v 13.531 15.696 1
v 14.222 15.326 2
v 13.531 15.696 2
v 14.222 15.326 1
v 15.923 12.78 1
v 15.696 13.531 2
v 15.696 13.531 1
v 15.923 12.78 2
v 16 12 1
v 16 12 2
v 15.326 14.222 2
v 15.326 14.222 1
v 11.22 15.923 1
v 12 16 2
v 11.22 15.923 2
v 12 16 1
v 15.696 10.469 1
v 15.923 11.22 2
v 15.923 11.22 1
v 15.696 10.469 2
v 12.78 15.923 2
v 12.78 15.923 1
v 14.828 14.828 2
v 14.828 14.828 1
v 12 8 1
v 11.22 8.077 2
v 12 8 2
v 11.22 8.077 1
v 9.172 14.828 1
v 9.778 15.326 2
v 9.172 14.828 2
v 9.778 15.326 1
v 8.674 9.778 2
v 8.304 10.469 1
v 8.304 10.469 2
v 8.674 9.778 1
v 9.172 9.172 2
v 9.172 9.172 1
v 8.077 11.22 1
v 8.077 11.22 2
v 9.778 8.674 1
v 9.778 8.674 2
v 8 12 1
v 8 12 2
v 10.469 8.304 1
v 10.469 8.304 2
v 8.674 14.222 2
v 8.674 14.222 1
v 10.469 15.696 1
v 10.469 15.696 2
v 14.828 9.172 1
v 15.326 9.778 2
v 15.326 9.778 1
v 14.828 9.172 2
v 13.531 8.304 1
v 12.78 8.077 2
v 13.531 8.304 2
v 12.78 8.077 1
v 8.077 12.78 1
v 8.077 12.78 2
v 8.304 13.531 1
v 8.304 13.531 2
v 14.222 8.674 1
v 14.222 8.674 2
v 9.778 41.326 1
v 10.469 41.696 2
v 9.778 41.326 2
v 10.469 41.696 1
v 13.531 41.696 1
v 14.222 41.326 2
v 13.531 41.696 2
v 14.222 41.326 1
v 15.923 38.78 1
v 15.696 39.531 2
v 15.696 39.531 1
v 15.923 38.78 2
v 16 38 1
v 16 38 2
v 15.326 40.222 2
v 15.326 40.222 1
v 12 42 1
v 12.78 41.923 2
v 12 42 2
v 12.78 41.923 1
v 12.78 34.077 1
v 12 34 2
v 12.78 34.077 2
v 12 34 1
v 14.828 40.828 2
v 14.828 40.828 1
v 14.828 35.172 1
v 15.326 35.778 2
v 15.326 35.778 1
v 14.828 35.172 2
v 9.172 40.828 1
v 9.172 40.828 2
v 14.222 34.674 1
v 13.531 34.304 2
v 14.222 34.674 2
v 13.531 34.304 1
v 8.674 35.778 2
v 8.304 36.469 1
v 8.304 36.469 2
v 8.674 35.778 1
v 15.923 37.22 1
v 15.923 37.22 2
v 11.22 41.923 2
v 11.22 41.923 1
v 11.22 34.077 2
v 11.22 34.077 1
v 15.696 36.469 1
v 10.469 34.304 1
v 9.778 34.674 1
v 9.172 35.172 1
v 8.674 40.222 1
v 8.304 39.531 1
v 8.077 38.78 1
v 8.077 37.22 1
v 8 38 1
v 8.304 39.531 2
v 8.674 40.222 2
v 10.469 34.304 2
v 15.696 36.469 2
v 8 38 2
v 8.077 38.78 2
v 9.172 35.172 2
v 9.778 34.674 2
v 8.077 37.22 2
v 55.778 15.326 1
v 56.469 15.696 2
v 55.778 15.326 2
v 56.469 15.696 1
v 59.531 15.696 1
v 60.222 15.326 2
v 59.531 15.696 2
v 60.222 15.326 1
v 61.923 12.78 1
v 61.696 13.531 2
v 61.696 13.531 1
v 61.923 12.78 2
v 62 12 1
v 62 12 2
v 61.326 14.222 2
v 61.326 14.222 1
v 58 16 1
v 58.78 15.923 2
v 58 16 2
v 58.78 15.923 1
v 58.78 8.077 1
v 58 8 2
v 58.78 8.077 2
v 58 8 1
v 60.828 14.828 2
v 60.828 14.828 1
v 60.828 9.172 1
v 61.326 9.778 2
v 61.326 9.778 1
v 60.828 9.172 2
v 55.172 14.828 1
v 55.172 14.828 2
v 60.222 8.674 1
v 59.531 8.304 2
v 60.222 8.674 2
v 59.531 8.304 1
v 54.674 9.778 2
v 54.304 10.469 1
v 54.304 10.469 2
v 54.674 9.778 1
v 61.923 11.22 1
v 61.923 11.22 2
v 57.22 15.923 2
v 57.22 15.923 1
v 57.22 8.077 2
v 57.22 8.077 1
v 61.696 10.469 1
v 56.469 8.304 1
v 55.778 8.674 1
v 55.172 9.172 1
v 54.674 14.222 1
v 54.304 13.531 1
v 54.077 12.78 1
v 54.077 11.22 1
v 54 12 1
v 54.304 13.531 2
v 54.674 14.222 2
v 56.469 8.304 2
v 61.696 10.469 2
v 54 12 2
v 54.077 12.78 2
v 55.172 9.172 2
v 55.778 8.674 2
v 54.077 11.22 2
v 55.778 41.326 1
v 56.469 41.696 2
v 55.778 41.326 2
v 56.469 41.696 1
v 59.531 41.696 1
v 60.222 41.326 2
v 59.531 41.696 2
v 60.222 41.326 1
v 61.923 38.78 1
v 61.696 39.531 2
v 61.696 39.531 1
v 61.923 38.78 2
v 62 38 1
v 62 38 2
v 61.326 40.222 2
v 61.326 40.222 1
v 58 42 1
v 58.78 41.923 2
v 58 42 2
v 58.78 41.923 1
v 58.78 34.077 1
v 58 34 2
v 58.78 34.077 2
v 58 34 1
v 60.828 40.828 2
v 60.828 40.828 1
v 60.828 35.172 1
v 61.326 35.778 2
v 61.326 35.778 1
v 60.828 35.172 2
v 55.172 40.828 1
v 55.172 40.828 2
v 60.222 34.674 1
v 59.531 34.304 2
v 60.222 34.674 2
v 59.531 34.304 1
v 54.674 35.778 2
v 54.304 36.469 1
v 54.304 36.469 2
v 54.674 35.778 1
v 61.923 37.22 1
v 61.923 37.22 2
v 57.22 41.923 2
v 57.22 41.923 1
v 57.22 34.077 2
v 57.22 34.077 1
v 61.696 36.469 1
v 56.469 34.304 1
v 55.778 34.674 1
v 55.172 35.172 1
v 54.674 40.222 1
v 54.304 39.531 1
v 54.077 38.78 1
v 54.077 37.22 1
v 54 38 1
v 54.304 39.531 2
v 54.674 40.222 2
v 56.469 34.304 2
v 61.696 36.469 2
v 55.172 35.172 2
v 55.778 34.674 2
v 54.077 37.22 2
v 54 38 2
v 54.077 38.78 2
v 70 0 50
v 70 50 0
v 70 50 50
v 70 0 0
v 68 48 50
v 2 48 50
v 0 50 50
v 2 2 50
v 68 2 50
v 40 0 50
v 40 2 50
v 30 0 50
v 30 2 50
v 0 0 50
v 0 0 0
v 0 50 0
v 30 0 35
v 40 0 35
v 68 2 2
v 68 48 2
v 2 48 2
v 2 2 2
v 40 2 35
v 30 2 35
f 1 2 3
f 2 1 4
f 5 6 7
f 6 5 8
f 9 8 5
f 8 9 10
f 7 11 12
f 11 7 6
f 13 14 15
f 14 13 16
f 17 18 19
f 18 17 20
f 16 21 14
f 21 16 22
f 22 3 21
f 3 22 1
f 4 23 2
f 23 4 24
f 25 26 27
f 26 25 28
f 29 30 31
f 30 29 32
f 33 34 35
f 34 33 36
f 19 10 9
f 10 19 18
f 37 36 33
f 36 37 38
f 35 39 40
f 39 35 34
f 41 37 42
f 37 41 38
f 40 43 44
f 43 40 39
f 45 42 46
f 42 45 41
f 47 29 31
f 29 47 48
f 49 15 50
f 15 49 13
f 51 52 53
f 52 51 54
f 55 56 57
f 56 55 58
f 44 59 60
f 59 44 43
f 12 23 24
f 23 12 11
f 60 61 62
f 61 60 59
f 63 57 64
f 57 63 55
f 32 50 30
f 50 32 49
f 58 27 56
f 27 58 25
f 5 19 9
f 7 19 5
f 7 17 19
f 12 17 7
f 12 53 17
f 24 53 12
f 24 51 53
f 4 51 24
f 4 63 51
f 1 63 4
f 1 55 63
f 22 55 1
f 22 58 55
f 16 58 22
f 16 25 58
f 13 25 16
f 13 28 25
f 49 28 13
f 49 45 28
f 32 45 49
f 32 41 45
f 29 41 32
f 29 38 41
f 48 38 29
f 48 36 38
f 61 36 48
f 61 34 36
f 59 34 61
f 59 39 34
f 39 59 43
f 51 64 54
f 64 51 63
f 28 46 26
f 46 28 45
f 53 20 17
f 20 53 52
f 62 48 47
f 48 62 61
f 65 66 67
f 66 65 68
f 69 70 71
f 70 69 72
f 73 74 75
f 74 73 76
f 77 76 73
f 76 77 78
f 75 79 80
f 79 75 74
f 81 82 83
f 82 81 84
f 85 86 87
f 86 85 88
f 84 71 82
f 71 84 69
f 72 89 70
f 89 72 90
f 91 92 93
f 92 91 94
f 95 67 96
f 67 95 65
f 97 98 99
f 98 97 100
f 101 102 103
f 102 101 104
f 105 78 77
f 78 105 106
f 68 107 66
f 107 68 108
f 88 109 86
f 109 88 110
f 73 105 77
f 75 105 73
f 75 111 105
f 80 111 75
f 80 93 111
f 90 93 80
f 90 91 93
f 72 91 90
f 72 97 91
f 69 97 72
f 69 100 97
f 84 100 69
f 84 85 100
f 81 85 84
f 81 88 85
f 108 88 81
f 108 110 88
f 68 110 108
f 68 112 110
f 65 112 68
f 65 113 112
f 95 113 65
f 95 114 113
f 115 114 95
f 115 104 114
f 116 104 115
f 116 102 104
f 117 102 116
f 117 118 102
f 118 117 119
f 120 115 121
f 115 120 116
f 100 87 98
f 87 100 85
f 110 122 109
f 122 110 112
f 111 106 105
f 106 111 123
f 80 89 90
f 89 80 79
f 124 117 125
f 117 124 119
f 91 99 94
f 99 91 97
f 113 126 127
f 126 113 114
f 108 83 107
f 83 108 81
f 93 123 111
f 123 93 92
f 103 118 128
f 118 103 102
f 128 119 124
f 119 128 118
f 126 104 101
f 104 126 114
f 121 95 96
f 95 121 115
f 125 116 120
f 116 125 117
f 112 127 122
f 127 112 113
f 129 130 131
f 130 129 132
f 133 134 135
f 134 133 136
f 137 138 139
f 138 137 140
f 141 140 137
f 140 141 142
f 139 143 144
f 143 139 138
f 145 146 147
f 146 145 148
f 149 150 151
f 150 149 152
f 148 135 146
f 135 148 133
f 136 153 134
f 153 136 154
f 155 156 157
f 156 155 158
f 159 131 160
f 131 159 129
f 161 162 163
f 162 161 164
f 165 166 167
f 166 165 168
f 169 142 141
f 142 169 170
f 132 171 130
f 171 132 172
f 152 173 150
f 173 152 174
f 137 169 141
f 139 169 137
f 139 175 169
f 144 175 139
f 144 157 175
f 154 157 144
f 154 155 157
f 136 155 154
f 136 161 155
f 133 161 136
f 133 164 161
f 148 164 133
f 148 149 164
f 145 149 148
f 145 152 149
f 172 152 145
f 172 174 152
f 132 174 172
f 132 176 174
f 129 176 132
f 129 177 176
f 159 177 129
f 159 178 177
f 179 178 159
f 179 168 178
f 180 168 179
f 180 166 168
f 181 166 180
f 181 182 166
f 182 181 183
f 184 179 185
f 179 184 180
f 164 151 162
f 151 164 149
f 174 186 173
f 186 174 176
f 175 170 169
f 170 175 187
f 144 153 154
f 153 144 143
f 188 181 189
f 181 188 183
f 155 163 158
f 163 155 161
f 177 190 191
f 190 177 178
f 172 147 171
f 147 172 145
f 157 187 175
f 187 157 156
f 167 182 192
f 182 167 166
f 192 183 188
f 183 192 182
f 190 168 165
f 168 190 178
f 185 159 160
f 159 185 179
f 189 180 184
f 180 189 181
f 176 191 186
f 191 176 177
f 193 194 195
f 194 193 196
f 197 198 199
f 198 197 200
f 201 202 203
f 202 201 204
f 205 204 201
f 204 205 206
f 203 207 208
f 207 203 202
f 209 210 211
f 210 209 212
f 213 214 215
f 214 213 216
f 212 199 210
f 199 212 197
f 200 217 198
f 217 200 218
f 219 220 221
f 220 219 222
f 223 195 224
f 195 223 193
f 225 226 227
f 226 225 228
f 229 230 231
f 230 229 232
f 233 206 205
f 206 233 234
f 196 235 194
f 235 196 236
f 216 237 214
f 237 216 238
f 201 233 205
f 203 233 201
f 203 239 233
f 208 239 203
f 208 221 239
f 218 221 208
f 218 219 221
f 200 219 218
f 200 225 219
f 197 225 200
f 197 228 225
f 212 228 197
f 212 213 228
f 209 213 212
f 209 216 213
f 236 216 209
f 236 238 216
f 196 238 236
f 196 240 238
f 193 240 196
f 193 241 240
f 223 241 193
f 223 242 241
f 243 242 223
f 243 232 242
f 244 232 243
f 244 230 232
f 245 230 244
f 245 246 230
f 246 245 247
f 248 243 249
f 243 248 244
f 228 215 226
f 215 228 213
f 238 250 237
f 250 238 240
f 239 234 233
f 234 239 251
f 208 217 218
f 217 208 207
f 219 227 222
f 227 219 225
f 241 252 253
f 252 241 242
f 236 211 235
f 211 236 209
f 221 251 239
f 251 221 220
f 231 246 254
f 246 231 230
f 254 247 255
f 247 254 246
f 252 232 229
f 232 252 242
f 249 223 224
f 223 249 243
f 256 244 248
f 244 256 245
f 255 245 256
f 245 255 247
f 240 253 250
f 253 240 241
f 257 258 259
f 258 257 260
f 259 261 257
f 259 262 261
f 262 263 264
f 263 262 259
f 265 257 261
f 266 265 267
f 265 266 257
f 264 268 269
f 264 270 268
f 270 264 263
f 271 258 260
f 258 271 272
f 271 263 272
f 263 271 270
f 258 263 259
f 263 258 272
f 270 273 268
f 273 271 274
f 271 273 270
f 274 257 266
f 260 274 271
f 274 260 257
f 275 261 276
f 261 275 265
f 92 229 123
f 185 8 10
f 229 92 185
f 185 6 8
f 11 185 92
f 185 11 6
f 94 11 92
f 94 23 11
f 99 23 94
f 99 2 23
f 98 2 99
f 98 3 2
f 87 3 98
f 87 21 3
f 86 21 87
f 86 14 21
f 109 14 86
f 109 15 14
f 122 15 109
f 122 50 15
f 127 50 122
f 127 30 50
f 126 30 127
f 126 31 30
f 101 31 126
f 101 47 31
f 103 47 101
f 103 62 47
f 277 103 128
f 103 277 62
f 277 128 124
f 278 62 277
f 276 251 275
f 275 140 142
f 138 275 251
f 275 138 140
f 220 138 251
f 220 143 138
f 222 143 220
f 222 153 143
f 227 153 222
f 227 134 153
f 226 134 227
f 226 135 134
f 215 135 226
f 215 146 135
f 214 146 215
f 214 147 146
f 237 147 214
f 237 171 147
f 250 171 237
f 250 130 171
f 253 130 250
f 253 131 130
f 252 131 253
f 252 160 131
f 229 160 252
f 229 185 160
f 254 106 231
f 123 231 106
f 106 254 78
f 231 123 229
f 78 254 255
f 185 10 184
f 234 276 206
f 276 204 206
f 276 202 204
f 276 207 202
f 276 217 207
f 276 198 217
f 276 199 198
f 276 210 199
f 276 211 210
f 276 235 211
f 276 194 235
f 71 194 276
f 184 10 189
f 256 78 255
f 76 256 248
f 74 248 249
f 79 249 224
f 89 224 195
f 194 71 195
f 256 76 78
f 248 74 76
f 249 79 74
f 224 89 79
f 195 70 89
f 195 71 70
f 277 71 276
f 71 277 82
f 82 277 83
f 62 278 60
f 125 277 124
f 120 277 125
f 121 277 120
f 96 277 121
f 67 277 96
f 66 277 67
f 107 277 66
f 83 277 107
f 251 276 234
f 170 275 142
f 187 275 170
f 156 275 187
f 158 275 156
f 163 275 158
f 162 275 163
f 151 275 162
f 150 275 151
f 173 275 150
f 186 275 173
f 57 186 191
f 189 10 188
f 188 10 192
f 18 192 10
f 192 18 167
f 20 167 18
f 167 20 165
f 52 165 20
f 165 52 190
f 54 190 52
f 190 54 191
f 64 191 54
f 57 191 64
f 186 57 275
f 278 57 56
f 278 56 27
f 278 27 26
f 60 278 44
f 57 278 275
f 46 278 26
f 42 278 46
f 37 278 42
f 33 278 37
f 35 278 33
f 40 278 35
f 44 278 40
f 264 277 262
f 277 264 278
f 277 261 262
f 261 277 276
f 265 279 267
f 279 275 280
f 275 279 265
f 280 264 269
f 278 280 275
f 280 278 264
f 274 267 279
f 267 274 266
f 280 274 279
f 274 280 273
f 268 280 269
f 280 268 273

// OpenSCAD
$fn = 32;

// ----------------------------------------------------------------------
// Enclosure box: both enclosure
// ----------------------------------------------------------------------

// --- parameters (mm) ---
box_l = 70;               // outer length, X
box_w = 50;               // outer width, Y
box_h = 50;               // outer height
wall_t = 2;               // wall thickness
boss_r = 4;               // corner boss radius
hole_r = 1.5;             // boss screw hole radius
boss_in = 12;             // boss inset from the corners
notch_w = 10;             // cable notch width
notch_h = 15;             // cable notch height

inner_h = box_h - wall_t;  // cavity depth
boss_h = inner_h - 2;  // corner boss height

difference() {
  cube([box_l, box_w, box_h]);
  translate([wall_t, wall_t, wall_t])
    cube([box_l - 2 * wall_t, box_w - 2 * wall_t, box_h]);
  for (sx = [0, 1], sy = [0, 1])
    translate([sx ? box_l - boss_in : boss_in,
               sy ? box_w - boss_in : boss_in, wall_t - 1]) {
      cylinder(r = boss_r, h = boss_h);
      translate([0, 0, boss_h - 4])
        cylinder(r = hole_r, h = 5);
    }
  translate([box_l / 2 - notch_w / 2, -1, box_h - notch_h])
    cube([notch_w, wall_t + 2, notch_h + 1]);
}
